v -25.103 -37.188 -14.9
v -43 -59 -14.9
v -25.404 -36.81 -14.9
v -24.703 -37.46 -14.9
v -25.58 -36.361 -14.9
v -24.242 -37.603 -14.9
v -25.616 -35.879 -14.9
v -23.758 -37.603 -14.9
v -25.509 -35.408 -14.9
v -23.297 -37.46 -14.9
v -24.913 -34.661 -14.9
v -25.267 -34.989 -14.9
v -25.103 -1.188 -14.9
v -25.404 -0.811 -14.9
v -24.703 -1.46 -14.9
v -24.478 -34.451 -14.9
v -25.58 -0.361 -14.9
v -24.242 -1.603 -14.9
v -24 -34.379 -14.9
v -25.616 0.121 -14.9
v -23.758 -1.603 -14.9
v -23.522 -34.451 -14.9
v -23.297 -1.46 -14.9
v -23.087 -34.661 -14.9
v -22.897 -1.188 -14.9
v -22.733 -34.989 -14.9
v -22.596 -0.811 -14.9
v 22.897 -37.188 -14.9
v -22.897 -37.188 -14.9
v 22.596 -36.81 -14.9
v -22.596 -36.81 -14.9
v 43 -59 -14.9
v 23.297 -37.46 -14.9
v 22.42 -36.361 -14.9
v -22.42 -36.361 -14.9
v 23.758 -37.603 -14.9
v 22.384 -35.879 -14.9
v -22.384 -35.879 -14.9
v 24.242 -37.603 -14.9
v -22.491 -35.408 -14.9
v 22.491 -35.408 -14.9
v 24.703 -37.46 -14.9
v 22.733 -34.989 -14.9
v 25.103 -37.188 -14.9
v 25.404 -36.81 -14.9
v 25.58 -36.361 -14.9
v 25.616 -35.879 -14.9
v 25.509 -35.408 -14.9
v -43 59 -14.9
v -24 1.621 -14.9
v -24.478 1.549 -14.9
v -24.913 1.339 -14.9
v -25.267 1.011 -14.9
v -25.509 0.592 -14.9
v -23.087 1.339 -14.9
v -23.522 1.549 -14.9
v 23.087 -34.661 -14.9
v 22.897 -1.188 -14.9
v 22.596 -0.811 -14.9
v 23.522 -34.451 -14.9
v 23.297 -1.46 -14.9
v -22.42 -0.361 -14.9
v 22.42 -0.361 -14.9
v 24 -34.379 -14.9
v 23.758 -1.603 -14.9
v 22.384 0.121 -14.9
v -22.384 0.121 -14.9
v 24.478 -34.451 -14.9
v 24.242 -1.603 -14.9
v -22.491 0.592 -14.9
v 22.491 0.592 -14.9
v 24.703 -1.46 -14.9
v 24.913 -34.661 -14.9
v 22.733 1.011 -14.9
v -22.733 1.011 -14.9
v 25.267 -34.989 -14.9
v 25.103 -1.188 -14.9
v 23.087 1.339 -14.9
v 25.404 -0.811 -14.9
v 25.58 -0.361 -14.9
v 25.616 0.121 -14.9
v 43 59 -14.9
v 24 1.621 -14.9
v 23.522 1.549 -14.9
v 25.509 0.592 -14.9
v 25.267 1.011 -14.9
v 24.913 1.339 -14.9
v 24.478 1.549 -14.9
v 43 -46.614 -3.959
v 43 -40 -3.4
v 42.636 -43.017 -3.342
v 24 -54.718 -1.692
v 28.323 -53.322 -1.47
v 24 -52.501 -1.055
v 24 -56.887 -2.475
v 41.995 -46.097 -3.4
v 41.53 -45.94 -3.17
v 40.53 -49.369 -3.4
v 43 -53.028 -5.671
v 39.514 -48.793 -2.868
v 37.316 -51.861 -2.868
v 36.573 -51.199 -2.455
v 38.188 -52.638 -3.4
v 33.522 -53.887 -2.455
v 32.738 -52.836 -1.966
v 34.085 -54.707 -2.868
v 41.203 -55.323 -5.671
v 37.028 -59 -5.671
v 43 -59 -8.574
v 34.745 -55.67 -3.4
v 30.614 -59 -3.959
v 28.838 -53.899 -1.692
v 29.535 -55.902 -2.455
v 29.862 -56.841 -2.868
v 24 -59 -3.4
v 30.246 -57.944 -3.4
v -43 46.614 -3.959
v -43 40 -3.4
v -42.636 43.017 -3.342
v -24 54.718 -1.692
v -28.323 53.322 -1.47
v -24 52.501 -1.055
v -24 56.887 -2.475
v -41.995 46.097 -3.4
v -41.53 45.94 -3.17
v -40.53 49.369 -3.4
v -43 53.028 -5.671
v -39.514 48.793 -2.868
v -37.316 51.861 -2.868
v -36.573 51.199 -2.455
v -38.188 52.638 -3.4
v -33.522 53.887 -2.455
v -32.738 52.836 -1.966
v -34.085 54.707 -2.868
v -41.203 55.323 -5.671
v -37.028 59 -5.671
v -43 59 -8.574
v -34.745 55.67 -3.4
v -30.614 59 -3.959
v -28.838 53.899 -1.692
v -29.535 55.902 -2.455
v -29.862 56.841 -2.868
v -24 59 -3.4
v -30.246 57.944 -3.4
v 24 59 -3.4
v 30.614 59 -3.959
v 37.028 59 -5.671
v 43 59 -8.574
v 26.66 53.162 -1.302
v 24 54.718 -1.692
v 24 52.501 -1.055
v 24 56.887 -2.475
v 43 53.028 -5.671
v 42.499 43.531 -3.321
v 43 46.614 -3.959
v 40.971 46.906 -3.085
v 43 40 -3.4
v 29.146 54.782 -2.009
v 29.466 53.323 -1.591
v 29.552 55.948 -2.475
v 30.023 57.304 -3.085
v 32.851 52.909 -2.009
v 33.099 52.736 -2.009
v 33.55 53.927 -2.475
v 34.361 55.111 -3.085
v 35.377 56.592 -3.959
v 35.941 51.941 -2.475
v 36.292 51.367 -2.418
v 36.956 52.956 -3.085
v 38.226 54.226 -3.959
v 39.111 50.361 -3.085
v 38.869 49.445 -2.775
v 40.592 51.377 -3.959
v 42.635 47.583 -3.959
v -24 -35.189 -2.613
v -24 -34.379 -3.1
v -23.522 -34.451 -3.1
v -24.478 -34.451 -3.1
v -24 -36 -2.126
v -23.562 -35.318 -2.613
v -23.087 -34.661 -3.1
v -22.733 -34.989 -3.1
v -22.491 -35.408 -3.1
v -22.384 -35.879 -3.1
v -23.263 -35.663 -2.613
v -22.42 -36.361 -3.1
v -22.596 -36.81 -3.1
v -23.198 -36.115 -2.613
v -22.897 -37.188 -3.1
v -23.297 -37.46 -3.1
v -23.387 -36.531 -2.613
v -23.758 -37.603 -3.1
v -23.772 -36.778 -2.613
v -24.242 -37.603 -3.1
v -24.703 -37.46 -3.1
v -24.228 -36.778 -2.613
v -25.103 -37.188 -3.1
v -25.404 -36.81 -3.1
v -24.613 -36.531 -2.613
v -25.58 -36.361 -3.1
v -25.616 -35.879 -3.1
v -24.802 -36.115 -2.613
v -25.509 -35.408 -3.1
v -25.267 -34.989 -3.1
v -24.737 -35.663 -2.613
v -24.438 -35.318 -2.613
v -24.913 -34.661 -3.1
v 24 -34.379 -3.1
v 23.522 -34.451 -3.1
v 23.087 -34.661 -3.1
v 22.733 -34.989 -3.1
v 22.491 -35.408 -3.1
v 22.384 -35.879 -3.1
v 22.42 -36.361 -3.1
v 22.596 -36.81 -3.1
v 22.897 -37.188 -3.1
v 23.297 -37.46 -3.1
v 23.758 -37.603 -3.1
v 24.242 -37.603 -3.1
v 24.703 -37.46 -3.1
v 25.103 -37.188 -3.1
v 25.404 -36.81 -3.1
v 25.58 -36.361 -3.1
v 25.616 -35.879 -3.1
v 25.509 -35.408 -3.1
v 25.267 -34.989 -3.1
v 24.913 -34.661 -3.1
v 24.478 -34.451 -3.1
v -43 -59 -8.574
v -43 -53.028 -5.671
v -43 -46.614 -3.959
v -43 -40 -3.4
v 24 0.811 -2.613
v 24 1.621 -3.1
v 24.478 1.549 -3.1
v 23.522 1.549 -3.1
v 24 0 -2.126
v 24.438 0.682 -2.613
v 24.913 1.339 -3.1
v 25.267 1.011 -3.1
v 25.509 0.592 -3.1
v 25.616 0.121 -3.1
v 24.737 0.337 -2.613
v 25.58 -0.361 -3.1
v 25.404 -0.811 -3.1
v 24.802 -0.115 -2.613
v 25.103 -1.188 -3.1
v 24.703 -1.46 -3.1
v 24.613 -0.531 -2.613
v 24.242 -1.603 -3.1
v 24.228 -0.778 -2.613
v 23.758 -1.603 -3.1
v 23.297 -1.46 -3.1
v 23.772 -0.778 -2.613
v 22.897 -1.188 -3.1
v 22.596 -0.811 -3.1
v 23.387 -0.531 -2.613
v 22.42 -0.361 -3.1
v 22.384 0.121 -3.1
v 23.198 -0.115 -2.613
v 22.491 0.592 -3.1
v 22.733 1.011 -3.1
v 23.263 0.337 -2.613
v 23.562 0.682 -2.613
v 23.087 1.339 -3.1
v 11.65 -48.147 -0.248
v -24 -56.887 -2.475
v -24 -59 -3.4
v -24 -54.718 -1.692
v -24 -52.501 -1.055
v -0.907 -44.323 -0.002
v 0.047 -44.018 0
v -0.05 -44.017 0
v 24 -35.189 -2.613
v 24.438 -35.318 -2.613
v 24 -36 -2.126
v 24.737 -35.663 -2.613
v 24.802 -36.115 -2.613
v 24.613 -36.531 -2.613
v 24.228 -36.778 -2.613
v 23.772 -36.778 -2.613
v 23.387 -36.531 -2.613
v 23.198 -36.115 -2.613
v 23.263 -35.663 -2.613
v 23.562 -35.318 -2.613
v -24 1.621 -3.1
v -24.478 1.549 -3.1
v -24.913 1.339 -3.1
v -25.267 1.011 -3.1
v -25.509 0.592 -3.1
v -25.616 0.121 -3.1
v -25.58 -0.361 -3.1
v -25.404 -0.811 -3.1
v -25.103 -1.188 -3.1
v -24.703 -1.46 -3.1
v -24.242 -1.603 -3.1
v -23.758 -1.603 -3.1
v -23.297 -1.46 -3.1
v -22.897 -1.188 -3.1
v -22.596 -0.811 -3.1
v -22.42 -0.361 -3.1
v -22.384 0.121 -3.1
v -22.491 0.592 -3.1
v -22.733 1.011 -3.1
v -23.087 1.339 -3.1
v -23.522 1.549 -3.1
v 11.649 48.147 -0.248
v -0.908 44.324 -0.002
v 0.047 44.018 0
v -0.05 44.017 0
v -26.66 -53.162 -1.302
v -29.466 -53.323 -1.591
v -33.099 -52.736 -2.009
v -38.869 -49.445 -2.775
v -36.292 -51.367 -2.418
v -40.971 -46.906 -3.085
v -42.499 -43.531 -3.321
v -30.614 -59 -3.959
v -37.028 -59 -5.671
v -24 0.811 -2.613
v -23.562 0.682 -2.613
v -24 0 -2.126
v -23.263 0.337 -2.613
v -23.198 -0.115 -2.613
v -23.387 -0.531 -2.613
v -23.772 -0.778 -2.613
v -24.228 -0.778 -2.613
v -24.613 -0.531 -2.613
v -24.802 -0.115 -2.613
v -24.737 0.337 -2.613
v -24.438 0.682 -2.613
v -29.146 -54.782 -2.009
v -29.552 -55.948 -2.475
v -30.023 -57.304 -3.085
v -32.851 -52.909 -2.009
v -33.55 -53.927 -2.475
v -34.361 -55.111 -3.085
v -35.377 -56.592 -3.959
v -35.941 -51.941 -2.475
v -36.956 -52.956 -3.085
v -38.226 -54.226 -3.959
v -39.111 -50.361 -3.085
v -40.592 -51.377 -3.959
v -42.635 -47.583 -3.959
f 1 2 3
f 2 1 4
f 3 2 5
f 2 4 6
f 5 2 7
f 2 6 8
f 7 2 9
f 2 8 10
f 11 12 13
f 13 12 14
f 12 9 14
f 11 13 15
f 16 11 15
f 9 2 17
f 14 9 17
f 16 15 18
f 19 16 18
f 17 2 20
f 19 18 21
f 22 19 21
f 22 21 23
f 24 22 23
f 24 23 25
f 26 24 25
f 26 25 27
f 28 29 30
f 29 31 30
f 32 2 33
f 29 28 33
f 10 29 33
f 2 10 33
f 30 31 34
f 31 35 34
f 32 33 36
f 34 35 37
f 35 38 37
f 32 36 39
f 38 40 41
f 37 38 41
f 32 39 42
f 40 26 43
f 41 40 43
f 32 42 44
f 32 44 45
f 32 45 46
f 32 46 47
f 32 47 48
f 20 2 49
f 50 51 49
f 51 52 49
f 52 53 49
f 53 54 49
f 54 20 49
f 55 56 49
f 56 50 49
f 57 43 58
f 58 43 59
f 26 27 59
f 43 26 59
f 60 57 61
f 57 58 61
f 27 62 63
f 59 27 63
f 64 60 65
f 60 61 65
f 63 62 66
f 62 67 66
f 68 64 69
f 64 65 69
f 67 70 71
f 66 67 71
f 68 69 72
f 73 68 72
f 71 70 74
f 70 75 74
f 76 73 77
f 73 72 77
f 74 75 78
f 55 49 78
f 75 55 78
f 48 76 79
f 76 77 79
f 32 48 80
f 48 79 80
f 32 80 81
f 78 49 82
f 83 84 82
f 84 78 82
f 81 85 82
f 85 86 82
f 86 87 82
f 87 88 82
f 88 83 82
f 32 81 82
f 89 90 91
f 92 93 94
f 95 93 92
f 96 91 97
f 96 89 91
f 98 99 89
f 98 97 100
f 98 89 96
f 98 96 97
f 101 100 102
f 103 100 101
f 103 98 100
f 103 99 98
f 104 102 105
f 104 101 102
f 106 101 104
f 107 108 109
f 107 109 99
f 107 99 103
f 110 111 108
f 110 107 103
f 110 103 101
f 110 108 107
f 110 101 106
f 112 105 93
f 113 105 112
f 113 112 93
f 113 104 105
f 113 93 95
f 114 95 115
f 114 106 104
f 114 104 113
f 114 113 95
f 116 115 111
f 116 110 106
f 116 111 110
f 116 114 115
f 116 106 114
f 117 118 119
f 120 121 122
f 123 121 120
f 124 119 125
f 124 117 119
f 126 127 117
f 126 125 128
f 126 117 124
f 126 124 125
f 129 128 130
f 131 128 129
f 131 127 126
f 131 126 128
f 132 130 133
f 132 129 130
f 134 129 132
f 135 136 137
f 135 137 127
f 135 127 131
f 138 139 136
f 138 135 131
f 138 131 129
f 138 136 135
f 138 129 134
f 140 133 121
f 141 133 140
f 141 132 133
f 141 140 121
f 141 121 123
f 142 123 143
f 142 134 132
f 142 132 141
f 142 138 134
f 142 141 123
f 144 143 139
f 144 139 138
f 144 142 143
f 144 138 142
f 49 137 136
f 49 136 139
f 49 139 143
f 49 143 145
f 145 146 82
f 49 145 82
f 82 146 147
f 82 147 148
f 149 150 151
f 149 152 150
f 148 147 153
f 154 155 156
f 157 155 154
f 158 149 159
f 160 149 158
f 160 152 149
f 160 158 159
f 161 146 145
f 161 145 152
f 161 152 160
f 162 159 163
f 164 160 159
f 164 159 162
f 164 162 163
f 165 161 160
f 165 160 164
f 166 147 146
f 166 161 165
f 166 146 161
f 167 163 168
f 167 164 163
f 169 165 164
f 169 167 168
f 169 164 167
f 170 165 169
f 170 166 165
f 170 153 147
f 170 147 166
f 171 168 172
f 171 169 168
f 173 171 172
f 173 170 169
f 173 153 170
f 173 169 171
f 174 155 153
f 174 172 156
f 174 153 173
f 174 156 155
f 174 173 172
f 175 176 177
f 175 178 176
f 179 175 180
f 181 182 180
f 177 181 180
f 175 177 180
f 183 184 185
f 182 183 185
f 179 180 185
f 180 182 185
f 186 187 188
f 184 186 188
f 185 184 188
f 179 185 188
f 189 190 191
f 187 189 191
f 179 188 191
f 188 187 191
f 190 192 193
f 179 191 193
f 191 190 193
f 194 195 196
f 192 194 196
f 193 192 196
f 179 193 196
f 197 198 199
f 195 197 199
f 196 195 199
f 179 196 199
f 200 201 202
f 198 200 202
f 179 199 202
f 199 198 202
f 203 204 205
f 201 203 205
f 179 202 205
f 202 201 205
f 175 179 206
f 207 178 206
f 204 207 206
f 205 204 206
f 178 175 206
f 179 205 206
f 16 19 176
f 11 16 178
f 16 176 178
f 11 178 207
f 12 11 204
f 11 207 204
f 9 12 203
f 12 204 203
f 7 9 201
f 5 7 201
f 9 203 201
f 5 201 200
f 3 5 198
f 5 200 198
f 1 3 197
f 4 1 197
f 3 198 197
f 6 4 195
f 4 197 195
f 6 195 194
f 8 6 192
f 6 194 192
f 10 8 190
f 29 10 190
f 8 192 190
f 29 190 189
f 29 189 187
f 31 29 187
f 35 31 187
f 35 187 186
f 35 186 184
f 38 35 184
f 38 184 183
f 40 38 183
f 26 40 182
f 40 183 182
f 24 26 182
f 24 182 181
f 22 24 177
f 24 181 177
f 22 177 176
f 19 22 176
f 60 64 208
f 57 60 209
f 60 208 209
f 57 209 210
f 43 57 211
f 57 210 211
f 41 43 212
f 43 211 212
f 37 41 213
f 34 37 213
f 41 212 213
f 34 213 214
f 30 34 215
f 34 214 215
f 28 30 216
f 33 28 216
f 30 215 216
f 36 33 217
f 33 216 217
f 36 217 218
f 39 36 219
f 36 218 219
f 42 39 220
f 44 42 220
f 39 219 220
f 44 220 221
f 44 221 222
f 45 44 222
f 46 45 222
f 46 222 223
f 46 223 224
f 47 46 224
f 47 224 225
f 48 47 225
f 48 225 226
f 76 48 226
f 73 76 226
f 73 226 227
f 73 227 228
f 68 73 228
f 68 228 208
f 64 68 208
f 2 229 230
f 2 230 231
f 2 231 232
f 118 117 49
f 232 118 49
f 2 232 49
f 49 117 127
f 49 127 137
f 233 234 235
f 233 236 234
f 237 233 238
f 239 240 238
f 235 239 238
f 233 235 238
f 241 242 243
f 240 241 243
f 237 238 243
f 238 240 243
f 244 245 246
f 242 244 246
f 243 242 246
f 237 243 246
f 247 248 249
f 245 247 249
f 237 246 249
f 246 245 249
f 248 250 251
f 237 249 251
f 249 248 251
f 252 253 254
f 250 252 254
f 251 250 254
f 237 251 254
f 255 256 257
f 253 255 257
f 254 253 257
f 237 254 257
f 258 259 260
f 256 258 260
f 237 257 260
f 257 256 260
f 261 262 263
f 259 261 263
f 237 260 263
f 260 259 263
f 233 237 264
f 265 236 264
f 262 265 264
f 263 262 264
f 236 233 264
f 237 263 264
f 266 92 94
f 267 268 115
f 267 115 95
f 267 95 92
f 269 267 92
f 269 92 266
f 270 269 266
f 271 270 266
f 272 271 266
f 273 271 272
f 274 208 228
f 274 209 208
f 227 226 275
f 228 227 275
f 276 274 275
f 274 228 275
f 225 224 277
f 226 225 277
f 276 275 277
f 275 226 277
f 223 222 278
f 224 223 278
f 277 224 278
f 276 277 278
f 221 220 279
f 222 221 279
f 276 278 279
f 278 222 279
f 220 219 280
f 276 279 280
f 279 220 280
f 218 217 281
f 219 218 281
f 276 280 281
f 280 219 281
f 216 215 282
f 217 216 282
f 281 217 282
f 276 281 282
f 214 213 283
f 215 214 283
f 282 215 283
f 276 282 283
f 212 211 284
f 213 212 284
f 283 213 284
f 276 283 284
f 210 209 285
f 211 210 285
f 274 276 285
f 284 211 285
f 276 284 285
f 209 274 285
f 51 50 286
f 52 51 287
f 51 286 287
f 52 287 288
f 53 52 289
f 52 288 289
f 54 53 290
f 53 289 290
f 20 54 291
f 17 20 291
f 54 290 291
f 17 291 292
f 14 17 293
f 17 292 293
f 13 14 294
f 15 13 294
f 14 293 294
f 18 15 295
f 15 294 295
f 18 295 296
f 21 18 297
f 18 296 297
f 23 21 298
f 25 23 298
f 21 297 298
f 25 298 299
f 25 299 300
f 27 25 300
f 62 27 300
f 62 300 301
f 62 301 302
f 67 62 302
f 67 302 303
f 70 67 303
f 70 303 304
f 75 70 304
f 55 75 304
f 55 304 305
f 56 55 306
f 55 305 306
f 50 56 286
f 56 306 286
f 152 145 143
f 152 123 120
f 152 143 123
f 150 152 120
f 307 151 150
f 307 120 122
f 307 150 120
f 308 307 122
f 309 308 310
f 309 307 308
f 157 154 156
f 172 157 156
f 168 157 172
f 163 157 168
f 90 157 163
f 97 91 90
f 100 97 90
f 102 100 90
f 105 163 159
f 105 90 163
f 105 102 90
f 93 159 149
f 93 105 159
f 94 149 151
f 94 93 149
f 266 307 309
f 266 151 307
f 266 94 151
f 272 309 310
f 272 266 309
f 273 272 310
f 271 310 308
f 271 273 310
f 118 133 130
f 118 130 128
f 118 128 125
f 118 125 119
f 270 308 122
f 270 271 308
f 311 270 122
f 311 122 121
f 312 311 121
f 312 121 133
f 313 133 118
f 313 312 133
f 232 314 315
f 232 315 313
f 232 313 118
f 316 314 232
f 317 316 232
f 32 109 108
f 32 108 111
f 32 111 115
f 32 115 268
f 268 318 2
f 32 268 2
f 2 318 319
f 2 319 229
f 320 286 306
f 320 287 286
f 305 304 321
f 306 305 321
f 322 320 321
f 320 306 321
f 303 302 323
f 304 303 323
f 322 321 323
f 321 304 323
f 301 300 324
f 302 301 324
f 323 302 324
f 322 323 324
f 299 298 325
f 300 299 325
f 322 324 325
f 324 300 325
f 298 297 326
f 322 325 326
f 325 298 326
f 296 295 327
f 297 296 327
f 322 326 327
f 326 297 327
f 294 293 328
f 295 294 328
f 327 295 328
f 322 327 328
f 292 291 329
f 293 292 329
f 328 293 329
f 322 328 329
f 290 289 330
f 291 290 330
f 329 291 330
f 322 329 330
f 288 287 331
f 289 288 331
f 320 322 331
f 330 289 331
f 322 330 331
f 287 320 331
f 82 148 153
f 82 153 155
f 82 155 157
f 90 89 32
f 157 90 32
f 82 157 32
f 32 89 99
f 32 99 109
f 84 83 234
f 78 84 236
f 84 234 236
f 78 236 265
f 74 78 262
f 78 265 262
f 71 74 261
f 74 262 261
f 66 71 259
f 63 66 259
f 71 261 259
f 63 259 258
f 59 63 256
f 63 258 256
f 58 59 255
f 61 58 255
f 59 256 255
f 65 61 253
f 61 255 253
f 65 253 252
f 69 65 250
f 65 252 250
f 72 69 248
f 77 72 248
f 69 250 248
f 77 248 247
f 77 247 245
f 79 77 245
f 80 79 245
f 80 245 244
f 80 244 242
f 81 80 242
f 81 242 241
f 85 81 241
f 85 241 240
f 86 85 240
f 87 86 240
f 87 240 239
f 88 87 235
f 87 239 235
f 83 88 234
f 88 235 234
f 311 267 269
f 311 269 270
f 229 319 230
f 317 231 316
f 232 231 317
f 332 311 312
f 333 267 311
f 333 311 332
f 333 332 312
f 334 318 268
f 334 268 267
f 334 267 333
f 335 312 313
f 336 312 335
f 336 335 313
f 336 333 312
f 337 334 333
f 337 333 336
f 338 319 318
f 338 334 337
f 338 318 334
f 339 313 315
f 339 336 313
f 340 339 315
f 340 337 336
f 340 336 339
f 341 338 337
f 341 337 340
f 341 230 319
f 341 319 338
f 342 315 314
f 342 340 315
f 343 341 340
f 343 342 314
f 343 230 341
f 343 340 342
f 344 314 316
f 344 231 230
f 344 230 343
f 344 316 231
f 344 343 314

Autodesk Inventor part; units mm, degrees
ref_plane "YZ Plane" through (0, 0, 0) normal (1, 0, 0) x (0, 1, 0)
ref_plane "XZ Plane" through (0, 0, 0) normal (0, 1, 0) x (-1, 0, 0)
ref_plane "XY Plane" through (0, 0, 0) normal (0, 0, 1) x (1, 0, 0)
sketch "Skizze1" plane through (0, 0, 0) normal (0, 0, 1) x (1, 0, 0)
  line L0 (-43, 59) -> (43, 59)
  line L1 (43, 59) -> (43, -59)
  line L2 (43, -59) -> (-43, -59)
  line L3 (-43, -59) -> (-43, 59)
  point P0 (0, 0)
  point P1 (0, 59)
  point P2 (-43, 0)
  dimension "d0" = 86
  dimension "d1" = 118
extrude "Extrusion1" add sketch "Skizze1" against normal blind 14.9
sketch "Skizze2" plane through (0, 0, -14.9) normal (0, 0, -1) x (-1, 0, 0)
  line L0 (-43, -59) -> (43, -59) projected
  point P0 (0, 0)
  point P1 (-24, 0)
  point P2 (24, 0)
  point P3 (24, -36)
  point P4 (-24, -36)
  dimension "d4" = 36
  dimension "d5" = 48
  dimension "d6" = 23
  dimension "d7" = 24
hole "Bohrung1" at (24, 0, -14.9) at (-24, 0, -14.9) at (-24, -36, -14.9) at (24, -36, -14.9) direction (0, 0, 1) diameter 3.242 depth 11.8 tip angle 118
sketch "Skizze3" plane through (0, 0, 0) normal (0, 0, 1) x (1, 0, 0)
  line L0 (-24, 44) -> (24, 44)
  line L1 (28, 40) -> (28, -40)
  line L2 (24, -44) -> (-24, -44)
  line L3 (-28, -40) -> (-28, 40)
  arc A0 (-28, -40) -> (-24, -44) centre (-24, -40) ccw
  arc A1 (-24, 44) -> (-28, 40) centre (-24, 40) ccw
  arc A2 (28, 40) -> (24, 44) centre (24, 40) ccw
  arc A3 (24, -44) -> (28, -40) centre (24, -40) ccw
  line L4 (43, -59) -> (43, 59) projected
  line L5 (-43, 59) -> (-43, -59) projected
  line L6 (43, 59) -> (-43, 59) projected
  line L7 (-43, -59) -> (43, -59) projected
  point P0 (0, 0)
  dimension "d15" = 4
  dimension "d16" = 15
  dimension "d17" = 15
  dimension "d18" = 15
  dimension "d19" = 15
sketch "Skizze4" plane through (0, 0, 0) normal (1, 0, 0) x (0, 1, 0)
  arc A0 (-44, 0) -> (-67, -8.688) centre (-44, -34.7882) ccw
  line L0 (59, 0) -> (-59, 0) projected
  line L1 (-44, 0) -> (-67, 0)
  line L2 (-67, 0) -> (-67, -8.688)
  line L3 (-59, 0) -> (-59, -14.9) projected
  line L4 (59, -14.9) -> (-59, -14.9) projected
  point P0 (0, 0)
  point P1 (-59, -3.4)
  dimension "d20" = 23
  dimension "d21" = 11.5
sweep "Sweeping1" cut profiles "Skizze4" path "Skizze3" path curves L2 A3 L1 A2 L0 A1 L3 A0
sketch "Skizze5" plane through (0, 0, 0) normal (0, 1, 0) x (-1, 0, 0)
  line L0 (24, 0) -> (-24, 0) projected
  line L1 (-43, -3.4) -> (-43, -8.5741) projected
  line L2 (-43, -8.5741) -> (-43, -14.9) projected
  line L3 (-43, -8.5741) -> (-43, -14.9) projected
  line L4 (-43, -8.5741) -> (-43, -3.4) projected
  line L5 (43, -8.5741) -> (43, -3.4) projected
  line L6 (43, -3.4) -> (43, -8.5741) projected
  line L7 (43, -8.5741) -> (43, -14.9) projected
  line L8 (43, -8.5741) -> (43, -14.9) projected
  arc A0 (43, -3.4) -> (-43, -3.4) centre (0, -273.6118) ccw
  line L9 (43, -3.4) -> (43, 1)
  line L10 (43, 1) -> (-43, 1)
  line L11 (-43, 1) -> (-43, -3.4)
  point P0 (0, 0)
  point P1 (43, -5.987)
  point P2 (-43, -5.987)
  dimension "d24" = 1
extrude "Extrusion2" cut sketch "Skizze5" along normal through all both and the other way through all
equation "\"d7\" = 0.5 * d5"
equation "\"d17\" = d16"
properties part number "kühlblock" material "Aluminium 6061"
